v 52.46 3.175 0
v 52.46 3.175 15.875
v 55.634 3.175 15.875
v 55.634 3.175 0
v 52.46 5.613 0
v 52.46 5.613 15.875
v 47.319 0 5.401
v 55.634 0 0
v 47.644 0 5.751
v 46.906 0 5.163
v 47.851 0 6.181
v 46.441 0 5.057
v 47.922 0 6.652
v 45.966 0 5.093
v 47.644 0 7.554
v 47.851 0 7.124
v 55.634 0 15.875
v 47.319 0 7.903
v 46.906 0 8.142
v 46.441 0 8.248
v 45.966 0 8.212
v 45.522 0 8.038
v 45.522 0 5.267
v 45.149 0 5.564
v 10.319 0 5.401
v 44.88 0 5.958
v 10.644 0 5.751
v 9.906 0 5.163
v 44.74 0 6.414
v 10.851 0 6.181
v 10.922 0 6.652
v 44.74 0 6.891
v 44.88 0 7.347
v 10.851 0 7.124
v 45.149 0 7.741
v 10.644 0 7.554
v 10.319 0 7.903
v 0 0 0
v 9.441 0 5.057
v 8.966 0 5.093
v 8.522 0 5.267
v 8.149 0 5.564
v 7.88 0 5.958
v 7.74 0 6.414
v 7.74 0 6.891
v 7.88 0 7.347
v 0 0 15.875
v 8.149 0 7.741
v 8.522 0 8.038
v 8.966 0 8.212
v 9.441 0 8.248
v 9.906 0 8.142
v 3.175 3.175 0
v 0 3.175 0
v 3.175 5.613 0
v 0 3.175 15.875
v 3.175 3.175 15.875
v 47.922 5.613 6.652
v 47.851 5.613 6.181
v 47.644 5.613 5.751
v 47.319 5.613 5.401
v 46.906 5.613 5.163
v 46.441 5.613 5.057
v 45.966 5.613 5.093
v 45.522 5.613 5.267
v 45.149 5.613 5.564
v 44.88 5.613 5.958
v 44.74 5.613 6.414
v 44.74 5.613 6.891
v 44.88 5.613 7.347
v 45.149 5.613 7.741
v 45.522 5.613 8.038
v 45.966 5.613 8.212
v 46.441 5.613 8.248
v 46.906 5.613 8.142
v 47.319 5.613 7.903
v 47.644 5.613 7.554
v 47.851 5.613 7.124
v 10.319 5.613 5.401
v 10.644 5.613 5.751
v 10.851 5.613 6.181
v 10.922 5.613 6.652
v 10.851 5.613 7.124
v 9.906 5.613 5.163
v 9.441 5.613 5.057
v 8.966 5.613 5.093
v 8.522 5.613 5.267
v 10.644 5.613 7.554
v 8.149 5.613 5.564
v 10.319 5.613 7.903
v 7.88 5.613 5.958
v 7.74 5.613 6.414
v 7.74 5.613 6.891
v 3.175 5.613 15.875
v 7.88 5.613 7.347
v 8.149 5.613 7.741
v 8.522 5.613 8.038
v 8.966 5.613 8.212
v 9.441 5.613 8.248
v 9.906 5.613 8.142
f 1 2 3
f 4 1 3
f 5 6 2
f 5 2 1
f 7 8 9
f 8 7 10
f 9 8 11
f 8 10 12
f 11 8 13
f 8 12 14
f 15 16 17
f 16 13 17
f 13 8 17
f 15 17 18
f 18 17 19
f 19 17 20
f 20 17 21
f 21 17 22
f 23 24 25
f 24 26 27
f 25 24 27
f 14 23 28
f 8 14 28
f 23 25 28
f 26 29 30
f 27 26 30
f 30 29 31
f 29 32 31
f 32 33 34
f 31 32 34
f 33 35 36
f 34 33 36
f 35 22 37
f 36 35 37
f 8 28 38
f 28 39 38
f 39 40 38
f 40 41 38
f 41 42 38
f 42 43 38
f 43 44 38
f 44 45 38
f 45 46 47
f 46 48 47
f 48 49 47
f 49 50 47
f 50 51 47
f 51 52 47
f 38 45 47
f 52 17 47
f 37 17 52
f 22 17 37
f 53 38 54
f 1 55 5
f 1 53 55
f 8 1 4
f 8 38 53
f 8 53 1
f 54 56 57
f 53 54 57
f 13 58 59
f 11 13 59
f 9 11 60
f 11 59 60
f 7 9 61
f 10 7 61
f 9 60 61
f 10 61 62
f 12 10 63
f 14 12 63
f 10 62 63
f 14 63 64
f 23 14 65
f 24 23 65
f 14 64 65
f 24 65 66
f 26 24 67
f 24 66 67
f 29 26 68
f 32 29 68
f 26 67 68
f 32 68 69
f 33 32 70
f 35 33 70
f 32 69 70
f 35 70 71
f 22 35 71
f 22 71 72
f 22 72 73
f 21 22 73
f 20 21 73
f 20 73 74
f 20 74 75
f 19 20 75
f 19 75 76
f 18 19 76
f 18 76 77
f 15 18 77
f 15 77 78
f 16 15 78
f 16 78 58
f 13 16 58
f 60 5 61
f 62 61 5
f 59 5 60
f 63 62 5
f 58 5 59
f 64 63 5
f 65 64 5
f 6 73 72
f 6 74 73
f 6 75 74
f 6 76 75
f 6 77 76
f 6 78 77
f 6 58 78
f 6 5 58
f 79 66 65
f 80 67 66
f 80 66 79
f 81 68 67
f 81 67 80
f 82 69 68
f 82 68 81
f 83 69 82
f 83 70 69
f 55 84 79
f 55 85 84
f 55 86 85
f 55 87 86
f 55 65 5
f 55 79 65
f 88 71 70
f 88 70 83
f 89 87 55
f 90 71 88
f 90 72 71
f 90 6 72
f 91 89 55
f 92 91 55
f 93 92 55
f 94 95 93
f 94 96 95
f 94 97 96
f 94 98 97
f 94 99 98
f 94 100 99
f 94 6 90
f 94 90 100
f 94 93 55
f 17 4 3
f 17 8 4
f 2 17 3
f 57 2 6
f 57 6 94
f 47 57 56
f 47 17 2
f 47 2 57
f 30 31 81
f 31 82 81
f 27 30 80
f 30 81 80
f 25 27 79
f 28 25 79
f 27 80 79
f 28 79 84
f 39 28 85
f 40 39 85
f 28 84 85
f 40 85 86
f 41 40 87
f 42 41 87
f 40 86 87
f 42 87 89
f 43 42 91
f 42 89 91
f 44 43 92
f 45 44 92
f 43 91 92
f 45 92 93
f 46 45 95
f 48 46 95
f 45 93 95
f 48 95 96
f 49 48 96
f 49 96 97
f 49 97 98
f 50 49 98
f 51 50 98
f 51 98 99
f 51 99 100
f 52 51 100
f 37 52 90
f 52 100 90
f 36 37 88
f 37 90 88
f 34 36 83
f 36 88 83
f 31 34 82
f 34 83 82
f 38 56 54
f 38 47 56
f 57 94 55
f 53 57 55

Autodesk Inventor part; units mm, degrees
ref_plane "YZ Plane" through (0, 0, 0) normal (1, 0, 0) x (0, 1, 0)
ref_plane "XZ Plane" through (0, 0, 0) normal (0, 1, 0) x (-1, 0, 0)
ref_plane "XY Plane" through (0, 0, 0) normal (0, 0, 1) x (1, 0, 0)
sketch "Sketch1" plane through (0, 0, 0) normal (0, 1, 0) x (-1, 0, 0)
  line L0 (0, 0) -> (-55.6345, 0)
  line L1 (-55.6345, 0) -> (-55.6345, 15.875)
  line L2 (-55.6345, 15.875) -> (0, 15.875)
  line L3 (0, 15.875) -> (0, 0)
  dimension "d0" = 55.6345
  dimension "d1" = 15.875
extrude "Extrusion1" add sketch "Sketch1" along normal blind 5.6134
sketch "Sketch7" plane through (0, 5.6134, 0) normal (0, 1, 0) x (1, 0, 0)
  circle A0 centre (9.3218, -6.6524) radius 1.6
  circle A1 centre (46.3218, -6.6524) radius 1.6
  line L0 (0, 0) -> (0, -15.875) projected
  line L1 (55.6345, 0) -> (0, 0) projected
  line L2 (55.6345, -15.875) -> (55.6345, 0) projected
  dimension "d22" = 3.2
  dimension "d23" = 3.2
  dimension "d24" = 37
  dimension "d43" = 6.6524
  dimension "d44" = 6.6524
  dimension "d48" = 9.3218
  dimension "d49" = 9.3127
extrude "Extrusion6" cut sketch "Sketch7" against normal blind 25.4
sketch "Sketch8" plane through (0, 5.6134, 0) normal (0, 1, 0) x (1, 0, 0)
  line L0 (55.6345, 0) -> (0, 0) projected
  line L1 (0, 0) -> (0, -15.875) projected
  line L2 (55.6345, -15.875) -> (55.6345, 0) projected
  line L3 (0, -15.875) -> (3.175, -15.875)
  line L4 (3.175, -15.875) -> (3.175, 0)
  line L5 (3.175, 0) -> (0, 0)
  line L6 (0, 0) -> (0, -15.875)
  line L7 (55.6345, -15.875) -> (52.4595, -15.875)
  line L8 (52.4595, -15.875) -> (52.4595, 0)
  line L9 (52.4595, 0) -> (55.6345, 0)
  line L10 (55.6345, 0) -> (55.6345, -15.875)
  dimension "d34" = 3.175
  dimension "d35" = 3.175
extrude "Extrusion7" cut sketch "Sketch8" against normal blind 2.4384
equation "\"d23\" = d22"
properties part number "Lidar Sensor Case Piece 3"
